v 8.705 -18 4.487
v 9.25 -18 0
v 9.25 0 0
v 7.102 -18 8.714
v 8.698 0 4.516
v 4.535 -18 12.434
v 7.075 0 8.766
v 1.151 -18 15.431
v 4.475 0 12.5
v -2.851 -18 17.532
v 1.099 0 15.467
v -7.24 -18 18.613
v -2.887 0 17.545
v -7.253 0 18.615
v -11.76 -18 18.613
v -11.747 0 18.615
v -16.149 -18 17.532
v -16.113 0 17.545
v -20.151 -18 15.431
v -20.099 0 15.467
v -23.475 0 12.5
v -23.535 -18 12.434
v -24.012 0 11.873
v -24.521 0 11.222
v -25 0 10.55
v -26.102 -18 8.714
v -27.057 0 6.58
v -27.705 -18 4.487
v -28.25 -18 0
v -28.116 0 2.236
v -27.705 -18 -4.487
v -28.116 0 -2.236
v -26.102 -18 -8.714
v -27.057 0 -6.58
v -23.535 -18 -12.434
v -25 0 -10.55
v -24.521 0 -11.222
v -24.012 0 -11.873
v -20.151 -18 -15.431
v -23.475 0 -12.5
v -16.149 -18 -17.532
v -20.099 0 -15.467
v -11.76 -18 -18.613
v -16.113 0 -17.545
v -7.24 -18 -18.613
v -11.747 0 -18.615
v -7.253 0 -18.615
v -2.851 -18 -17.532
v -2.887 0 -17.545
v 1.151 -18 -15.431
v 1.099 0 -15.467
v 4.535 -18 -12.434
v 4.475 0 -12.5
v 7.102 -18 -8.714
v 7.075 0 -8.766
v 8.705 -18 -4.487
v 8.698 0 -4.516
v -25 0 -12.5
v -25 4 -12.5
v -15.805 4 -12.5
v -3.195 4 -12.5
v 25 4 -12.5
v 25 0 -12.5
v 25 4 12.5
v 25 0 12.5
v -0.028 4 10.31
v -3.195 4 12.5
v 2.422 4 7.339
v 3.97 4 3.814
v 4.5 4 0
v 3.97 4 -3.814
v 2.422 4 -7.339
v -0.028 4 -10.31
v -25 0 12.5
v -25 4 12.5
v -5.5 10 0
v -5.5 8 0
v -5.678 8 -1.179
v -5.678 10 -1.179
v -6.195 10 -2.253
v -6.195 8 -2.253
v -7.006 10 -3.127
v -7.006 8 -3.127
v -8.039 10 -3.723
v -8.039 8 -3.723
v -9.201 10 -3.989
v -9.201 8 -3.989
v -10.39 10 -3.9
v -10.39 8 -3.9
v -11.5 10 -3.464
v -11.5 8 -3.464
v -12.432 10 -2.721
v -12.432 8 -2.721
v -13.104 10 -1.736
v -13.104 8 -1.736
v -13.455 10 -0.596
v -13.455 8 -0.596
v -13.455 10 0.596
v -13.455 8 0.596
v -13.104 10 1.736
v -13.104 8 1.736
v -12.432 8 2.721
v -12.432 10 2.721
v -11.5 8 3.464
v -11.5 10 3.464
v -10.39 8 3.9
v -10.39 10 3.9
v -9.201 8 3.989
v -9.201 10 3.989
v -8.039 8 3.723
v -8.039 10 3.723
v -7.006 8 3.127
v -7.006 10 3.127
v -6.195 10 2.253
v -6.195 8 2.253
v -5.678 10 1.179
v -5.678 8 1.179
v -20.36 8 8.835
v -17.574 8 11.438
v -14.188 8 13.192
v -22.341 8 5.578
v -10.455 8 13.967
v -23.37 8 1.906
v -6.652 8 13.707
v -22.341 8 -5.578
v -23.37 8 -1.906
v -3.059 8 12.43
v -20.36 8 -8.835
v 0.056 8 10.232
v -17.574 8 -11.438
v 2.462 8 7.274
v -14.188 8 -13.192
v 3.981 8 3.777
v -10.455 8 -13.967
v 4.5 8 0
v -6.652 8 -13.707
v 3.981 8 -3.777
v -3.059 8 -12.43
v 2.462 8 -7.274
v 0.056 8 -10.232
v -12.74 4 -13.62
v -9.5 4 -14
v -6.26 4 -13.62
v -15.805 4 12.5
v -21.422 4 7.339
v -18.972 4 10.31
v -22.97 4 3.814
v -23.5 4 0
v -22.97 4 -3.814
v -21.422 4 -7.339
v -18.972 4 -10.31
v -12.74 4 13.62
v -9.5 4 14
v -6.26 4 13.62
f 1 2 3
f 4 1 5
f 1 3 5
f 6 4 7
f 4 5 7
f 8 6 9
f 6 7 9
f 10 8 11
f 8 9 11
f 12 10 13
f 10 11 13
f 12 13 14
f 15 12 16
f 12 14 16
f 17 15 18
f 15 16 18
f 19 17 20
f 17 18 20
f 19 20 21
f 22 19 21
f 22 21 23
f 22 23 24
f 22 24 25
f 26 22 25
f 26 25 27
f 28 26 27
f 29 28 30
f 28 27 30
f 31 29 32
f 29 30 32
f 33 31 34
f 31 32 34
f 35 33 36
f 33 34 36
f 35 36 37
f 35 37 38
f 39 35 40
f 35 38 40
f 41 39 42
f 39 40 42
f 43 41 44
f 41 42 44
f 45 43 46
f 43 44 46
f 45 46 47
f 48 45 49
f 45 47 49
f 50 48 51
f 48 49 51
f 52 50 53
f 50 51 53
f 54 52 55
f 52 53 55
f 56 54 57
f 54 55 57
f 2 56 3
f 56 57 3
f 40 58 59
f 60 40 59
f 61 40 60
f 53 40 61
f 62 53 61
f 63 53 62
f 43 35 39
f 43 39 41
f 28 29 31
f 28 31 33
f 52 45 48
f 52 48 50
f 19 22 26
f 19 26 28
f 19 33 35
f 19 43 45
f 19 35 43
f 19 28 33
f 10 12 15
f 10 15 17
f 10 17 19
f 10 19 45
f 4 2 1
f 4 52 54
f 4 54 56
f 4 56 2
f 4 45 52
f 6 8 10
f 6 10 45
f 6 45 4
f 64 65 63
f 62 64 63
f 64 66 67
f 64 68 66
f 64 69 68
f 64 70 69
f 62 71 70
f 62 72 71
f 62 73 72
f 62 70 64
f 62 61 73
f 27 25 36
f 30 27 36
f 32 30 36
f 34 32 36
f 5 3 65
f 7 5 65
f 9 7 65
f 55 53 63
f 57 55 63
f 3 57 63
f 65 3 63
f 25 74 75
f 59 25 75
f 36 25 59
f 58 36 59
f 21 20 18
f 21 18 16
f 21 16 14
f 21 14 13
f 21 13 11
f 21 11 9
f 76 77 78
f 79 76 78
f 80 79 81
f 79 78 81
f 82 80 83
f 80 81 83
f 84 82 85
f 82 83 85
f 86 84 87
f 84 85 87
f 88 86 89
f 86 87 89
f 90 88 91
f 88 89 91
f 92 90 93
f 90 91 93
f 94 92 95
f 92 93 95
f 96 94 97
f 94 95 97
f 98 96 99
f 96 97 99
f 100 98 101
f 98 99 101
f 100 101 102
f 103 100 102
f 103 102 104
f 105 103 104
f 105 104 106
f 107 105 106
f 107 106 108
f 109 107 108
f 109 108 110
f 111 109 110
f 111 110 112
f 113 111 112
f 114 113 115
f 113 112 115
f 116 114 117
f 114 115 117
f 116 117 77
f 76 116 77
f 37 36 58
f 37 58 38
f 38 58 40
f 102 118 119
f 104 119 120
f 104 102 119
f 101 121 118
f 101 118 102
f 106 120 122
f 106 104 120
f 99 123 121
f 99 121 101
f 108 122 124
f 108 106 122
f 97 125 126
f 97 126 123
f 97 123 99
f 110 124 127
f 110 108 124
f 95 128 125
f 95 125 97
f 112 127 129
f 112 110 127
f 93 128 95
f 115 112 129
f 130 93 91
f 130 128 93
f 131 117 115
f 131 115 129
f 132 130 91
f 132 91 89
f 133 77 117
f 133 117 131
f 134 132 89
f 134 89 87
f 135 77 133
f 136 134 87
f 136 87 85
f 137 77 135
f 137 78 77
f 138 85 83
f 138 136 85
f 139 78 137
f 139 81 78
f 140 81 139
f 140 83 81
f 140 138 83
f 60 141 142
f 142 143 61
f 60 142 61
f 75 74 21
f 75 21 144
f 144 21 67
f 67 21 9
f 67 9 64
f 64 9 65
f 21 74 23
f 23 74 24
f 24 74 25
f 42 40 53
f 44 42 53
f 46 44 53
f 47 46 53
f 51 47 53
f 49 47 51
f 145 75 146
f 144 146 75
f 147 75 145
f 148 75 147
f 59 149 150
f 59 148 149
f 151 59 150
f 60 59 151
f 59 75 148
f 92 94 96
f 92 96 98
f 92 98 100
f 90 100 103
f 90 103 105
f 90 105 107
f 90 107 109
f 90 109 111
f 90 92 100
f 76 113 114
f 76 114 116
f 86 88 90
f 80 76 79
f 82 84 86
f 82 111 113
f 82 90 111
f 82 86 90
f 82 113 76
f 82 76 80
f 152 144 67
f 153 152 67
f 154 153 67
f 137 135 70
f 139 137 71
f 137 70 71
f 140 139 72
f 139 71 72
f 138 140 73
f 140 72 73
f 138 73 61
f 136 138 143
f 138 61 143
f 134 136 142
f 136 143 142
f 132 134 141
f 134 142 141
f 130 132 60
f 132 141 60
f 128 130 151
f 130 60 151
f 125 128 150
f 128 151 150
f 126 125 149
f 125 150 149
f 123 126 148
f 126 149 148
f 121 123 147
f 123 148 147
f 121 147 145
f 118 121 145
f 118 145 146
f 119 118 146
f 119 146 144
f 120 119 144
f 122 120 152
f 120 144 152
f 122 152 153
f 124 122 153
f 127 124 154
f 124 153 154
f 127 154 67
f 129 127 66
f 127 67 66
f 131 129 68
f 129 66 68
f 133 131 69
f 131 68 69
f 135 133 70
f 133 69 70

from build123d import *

# Parameters (mm, degrees)
SKETCH1_W           = 50
SKETCH1_H           = 25
BOSS_EXTRUDE1_DEPTH = 4
SKETCH2_R           = 14
BOSS_EXTRUDE2_DEPTH = 4
SKETCH3_R           = 4
BOSS_EXTRUDE3_DEPTH = 2
SKETCH4_R           = 18.75
BOSS_EXTRUDE4_DEPTH = 18


with BuildPart() as part:
    # Sketch1 → Boss-Extrude1 (new body)
    with BuildSketch(Plane(origin=(0, 0, 0), x_dir=(1, 0, 0), z_dir=(0, 1, 0))):
        Rectangle(SKETCH1_W, SKETCH1_H)
    extrude(amount=BOSS_EXTRUDE1_DEPTH)

    # Sketch2 → Boss-Extrude2 (add)
    with BuildSketch(Plane(origin=(0, 4, 0), x_dir=(1, 0, 0), z_dir=(0, 1, 0))):
        with Locations((-9.5, 0)):
            Circle(SKETCH2_R)
    extrude(amount=BOSS_EXTRUDE2_DEPTH)

    # Sketch3 → Boss-Extrude3 (add)
    with BuildSketch(Plane(origin=(0, 8, 0), x_dir=(1, 0, 0), z_dir=(0, 1, 0))):
        with Locations((-9.5, 0)):
            Circle(SKETCH3_R)
    extrude(amount=BOSS_EXTRUDE3_DEPTH)

    # Sketch4 → Boss-Extrude4 (add)
    with BuildSketch(Plane.XZ):
        with Locations((-9.5, 0)):
            Circle(SKETCH4_R)
    extrude(amount=BOSS_EXTRUDE4_DEPTH)


solid = part.part
